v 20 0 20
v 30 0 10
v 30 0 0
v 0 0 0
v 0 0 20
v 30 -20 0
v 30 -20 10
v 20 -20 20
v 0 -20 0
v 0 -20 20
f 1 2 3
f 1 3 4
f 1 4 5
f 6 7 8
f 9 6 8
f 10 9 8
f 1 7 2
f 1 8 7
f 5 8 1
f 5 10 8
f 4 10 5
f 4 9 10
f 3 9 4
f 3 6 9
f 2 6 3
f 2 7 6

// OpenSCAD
// flat top + a 45 deg chamfer (steeper than 20 deg): no stair-step line.
rotate([90,0,0]) linear_extrude(20) polygon([[0,0],[30,0],[30,10],[20,20],[0,20]]);
